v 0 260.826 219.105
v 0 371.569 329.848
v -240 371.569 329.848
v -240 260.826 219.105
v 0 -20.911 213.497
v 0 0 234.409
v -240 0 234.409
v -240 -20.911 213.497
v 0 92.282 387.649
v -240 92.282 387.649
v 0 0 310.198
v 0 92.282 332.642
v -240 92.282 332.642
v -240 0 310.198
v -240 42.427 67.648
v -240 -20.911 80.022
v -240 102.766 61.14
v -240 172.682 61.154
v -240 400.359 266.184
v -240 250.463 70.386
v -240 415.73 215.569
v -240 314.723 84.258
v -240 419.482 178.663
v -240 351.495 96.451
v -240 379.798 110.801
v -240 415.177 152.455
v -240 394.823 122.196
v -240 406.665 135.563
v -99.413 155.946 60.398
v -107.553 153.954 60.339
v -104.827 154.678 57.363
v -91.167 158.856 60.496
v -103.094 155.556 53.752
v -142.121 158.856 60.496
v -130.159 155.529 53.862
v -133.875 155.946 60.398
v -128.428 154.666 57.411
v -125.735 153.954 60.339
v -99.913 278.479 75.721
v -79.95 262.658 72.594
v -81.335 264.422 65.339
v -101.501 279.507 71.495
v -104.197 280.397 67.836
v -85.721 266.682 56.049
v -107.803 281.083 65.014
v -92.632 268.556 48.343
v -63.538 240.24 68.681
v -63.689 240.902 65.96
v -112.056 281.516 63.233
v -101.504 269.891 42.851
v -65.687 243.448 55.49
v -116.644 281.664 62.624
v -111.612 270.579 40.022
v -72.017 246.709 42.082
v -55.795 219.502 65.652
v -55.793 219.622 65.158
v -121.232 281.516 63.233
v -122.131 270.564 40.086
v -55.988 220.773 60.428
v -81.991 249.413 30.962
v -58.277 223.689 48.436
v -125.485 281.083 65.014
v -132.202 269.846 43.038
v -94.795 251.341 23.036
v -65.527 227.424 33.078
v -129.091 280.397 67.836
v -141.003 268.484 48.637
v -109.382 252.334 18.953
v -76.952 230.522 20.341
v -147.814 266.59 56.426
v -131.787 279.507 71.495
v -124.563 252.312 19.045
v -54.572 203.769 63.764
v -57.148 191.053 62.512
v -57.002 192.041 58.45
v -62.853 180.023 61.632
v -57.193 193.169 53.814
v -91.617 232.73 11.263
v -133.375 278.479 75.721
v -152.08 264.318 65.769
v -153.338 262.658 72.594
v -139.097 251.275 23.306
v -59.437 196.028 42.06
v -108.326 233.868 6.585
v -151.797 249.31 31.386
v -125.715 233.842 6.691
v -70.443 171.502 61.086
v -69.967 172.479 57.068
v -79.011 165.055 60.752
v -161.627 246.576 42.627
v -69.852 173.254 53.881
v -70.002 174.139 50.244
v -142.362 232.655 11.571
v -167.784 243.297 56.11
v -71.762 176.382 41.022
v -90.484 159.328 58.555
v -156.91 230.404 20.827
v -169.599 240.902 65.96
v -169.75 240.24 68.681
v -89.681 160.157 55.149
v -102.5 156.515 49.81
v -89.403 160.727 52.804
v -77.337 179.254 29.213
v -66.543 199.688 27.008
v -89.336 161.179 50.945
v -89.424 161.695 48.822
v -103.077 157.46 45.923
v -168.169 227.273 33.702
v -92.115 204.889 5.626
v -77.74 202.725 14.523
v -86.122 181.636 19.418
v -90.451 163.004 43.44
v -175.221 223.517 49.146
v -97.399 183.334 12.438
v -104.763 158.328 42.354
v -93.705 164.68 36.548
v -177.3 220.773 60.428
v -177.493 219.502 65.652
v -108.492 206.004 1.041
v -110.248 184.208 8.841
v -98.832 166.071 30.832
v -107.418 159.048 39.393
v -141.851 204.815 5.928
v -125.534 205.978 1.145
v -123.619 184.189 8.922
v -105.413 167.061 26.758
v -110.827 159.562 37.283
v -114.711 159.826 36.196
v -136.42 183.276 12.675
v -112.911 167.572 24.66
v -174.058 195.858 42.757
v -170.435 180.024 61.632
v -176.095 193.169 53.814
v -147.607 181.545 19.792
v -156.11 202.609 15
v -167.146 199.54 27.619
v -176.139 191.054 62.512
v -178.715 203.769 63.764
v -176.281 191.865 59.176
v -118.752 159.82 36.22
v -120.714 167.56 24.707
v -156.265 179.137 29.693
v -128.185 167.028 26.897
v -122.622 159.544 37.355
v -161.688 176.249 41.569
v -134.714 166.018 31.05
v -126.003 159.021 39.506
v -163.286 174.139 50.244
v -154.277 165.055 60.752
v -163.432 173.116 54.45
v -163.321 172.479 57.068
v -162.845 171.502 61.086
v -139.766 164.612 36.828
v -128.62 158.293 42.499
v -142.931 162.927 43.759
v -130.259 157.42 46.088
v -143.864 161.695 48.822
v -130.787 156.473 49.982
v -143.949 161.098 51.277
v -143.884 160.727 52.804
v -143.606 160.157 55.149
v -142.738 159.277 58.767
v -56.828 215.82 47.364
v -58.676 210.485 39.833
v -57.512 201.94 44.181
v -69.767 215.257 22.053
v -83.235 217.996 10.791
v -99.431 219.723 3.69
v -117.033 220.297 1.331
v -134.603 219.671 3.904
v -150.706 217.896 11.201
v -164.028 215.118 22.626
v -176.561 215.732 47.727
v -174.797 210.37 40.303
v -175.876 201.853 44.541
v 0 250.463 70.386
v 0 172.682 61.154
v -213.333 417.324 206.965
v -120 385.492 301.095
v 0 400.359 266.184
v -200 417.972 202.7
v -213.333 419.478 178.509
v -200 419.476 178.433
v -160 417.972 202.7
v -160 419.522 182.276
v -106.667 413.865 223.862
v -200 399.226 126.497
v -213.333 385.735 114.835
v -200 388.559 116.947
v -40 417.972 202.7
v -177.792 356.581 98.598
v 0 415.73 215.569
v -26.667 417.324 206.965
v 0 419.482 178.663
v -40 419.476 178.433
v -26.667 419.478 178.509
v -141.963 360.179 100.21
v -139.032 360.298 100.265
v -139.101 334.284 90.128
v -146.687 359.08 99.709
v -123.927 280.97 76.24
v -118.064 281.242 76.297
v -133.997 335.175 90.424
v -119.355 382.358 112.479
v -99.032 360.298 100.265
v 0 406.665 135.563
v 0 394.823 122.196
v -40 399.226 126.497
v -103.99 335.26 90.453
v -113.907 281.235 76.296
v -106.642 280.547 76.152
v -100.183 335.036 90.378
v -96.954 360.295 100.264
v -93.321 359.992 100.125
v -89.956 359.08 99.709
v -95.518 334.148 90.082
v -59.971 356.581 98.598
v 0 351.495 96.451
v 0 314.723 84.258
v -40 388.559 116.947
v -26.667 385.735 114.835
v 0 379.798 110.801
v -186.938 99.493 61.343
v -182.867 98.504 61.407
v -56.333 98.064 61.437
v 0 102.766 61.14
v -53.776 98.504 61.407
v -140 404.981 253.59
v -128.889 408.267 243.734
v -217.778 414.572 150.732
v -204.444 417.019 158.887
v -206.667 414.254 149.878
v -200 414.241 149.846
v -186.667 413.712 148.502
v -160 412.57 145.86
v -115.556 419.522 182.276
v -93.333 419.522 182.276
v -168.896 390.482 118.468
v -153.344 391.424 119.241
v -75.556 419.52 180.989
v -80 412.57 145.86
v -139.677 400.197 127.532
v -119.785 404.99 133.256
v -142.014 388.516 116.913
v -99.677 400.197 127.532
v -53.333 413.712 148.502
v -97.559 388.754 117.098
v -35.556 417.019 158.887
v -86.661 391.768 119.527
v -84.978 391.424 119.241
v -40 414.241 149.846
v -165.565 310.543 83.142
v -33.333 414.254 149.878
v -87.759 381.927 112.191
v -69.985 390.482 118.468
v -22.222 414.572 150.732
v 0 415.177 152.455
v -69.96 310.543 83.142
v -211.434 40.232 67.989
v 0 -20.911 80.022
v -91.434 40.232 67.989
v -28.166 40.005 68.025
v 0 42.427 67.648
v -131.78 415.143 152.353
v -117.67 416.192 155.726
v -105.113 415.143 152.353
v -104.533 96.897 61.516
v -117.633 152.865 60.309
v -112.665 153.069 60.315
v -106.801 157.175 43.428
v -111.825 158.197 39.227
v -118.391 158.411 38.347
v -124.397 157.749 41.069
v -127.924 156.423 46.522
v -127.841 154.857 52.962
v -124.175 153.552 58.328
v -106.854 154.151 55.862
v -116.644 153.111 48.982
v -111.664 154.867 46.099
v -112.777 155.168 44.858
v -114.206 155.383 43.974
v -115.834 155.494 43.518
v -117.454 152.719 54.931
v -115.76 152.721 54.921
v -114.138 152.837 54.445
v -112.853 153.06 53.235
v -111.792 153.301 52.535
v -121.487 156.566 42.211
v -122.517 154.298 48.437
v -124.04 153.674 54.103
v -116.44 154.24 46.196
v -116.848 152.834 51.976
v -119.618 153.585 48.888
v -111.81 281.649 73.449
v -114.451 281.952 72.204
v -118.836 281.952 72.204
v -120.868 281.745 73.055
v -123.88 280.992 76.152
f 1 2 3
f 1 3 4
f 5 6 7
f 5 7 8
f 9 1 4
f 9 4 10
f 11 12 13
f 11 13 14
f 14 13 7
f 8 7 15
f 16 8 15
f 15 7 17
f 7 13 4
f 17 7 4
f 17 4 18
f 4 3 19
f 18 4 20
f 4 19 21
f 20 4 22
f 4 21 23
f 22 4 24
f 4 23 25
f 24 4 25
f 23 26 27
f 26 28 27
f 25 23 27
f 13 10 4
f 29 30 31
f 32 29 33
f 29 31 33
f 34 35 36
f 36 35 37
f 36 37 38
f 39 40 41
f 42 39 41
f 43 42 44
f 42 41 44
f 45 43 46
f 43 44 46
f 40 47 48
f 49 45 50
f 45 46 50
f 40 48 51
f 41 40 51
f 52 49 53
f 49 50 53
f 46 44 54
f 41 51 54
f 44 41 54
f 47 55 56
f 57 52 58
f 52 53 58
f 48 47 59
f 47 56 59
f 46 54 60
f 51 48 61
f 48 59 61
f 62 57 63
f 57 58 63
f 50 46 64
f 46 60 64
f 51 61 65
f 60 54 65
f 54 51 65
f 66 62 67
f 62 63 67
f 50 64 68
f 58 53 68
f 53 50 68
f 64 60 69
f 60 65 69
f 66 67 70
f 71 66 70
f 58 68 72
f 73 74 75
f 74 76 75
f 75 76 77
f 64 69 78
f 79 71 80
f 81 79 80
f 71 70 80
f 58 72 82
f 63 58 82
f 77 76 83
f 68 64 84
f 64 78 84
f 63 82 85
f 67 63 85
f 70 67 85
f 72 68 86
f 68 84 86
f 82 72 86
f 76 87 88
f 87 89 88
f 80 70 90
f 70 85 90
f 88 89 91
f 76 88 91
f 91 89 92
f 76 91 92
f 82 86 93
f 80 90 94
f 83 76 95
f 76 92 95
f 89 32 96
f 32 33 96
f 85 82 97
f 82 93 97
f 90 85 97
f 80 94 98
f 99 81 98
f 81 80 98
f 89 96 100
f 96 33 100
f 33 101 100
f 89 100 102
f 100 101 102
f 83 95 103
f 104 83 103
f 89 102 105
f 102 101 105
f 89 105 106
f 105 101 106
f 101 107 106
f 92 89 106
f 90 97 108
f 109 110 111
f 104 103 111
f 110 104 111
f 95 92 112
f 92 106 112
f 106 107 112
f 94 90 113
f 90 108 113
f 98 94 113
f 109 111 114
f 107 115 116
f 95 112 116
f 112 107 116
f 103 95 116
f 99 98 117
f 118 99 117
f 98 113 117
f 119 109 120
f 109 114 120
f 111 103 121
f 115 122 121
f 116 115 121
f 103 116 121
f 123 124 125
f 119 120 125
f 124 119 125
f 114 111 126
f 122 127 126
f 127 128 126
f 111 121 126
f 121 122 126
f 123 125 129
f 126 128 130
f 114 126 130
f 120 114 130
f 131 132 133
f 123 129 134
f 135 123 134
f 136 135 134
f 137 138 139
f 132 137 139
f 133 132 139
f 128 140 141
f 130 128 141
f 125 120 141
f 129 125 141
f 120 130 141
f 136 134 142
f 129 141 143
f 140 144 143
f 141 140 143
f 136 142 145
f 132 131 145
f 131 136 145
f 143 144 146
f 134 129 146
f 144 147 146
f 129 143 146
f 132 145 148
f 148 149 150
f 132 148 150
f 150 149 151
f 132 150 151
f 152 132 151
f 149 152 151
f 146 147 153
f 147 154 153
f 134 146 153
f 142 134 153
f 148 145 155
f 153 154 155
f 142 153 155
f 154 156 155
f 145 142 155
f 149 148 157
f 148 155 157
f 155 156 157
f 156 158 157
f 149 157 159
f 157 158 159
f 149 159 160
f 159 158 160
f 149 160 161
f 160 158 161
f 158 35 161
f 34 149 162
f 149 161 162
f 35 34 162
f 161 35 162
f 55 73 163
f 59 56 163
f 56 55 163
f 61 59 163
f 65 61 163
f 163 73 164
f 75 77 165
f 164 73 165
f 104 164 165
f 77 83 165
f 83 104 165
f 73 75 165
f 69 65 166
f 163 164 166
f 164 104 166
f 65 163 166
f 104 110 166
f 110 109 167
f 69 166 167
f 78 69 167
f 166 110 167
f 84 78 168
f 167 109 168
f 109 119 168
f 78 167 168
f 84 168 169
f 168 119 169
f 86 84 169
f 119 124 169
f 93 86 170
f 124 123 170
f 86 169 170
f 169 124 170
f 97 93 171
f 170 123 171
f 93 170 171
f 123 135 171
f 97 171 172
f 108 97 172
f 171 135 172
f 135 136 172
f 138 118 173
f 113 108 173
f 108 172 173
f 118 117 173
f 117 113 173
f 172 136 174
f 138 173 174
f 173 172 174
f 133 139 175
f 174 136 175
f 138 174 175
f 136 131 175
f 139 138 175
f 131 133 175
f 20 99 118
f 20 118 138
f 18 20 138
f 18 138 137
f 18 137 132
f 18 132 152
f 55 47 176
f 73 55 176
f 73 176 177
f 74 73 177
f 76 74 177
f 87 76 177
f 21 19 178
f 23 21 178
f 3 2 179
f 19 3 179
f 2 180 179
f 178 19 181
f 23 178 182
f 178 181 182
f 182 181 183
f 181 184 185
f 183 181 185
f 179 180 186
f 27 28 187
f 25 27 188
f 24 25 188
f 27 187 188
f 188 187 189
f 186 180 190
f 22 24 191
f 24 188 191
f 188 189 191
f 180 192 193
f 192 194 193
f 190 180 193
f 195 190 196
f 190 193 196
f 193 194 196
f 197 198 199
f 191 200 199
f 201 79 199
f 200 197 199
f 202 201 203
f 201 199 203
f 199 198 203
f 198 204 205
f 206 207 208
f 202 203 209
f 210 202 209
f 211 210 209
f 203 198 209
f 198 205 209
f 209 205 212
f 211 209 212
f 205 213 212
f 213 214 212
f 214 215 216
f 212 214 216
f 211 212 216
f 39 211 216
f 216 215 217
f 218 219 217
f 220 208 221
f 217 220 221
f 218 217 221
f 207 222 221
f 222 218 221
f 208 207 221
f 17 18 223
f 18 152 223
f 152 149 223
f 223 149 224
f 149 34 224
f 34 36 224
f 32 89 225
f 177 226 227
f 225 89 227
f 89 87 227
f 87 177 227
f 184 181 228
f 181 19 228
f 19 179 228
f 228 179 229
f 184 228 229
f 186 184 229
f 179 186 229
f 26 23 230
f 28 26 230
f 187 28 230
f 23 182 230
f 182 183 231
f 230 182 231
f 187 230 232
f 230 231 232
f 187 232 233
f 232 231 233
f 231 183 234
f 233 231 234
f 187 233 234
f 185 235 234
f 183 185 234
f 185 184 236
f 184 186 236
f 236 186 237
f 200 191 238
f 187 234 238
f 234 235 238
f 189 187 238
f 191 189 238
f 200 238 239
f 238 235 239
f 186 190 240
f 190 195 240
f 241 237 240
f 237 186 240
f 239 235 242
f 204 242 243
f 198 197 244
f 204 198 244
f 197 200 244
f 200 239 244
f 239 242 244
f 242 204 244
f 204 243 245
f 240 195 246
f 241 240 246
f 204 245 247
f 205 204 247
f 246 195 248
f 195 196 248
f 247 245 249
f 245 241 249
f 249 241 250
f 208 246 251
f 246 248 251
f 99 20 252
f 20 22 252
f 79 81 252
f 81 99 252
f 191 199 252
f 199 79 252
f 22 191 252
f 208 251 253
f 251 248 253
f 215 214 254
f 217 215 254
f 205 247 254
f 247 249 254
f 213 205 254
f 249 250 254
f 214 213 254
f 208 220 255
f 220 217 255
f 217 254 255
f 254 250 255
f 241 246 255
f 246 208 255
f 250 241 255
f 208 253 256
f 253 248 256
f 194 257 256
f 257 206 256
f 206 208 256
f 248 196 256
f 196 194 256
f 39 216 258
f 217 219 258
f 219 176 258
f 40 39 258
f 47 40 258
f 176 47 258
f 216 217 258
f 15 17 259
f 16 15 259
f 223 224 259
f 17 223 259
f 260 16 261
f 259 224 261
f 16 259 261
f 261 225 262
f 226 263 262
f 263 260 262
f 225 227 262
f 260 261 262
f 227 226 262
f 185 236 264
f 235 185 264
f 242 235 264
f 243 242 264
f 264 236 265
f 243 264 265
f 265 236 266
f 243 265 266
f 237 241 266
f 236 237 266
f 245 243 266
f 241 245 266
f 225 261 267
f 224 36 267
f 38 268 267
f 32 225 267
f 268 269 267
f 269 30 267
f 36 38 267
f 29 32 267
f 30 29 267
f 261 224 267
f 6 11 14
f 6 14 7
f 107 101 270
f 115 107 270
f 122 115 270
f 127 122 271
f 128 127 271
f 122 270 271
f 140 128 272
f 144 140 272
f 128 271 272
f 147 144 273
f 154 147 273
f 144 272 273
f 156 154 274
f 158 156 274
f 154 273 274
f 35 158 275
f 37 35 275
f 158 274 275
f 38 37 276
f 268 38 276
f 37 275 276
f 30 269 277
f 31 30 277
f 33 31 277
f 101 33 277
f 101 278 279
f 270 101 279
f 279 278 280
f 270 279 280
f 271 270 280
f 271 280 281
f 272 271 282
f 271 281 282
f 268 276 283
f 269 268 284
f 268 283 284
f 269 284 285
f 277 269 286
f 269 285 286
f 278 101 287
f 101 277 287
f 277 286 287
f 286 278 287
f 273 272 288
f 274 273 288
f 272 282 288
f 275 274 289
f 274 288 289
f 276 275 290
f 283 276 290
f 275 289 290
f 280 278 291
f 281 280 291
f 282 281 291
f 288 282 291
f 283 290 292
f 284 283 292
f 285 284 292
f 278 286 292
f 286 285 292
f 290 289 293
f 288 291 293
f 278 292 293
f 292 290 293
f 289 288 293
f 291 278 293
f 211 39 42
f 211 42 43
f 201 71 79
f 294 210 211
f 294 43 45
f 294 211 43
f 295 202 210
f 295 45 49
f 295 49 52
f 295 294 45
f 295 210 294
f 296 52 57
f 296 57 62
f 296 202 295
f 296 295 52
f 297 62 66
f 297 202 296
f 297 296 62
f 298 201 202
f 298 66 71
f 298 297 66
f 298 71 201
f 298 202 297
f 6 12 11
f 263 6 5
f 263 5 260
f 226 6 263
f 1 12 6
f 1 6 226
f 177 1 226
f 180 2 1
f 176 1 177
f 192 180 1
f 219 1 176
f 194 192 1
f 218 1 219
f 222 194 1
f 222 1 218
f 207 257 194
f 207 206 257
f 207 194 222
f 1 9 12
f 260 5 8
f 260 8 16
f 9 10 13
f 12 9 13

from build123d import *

# Parameters (mm, degrees)
BOSS_EXTRUDE1_DEPTH = 24
SKETCH11_R          = 5.697753685
CUT_EXTRUDE4_DEPTH  = 7
SCALE1_SCALE        = 10


with BuildPart() as part:
    # Sketch2 → Boss-Extrude1 (new body)
    with BuildSketch(Plane(origin=(0, 0, 0), x_dir=(0, 0, -1), z_dir=(1, 0, 0))):
        with BuildLine():
            Line((-32.984771151, 37.156853259), (-21.910488843, 26.082570951))
            Line((-21.910488843, 26.082570951), (-38.764900737, 9.228159057))
            Line((-38.764900737, 9.228159057), (-33.264173814, 9.228159057))
            Line((-33.264173814, 9.228159057), (-31.019846879, 0))
            Line((-31.019846879, 0), (-23.440853259, 0))
            Line((-23.440853259, 0), (-21.34974547, -2.091107789))
            Line((-21.34974547, -2.091107789), (-8.002162552, -2.091107789))
            add(Edge.make_bspline(
                [(-32.984771151, 37.156853259), (-28.59740608, 39.351452903), (-12.654264242, 47.061104602), (-5.191801864, 21.120328129), (-5.563958224, 8.398722741), (-8.002162552, -2.091107789)],
                knots=[0, 0, 0, 0, 0.297117955, 0.53565113, 1, 1, 1, 1], degree=3))
        make_face()
    extrude(amount=-BOSS_EXTRUDE1_DEPTH)

    # Sketch11 → Cut-Extrude4 (cut)
    with BuildSketch(Plane(origin=(0, 1.148199013, -4.721131737), x_dir=(-1, 0, 0), z_dir=(0, 0.23631575032824995, -0.9716763175804979))):
        with Locations((11.664383963, 22.358606811)):
            Circle(SKETCH11_R)
    extrude(amount=-CUT_EXTRUDE4_DEPTH, mode=Mode.SUBTRACT)

    # Sketch67 → Revolve1 (revolve)
    with BuildSketch(Plane(origin=(0, -0.269695489, 1.108926168), x_dir=(1, 0, 0), z_dir=(0, -0.23631575032824995, 0.9716763175804979))):
        with BuildLine():
            Line((-11.664383963, 29.106819343), (-11.664383963, 16.034921428))
            add(Edge.make_bspline(
                [(-10.249978258, 16.385269123), (-10.936701733, 16.123637578), (-11.664383963, 16.034921428)],
                knots=[0, 0, 0, 1, 1, 1], degree=2))
            add(Edge.make_bspline(
                [(-9.952034037, 28.848556307), (-5.742682801, 26.309194224), (-2.240550386, 18.762433328), (-10.249978258, 16.385269123)],
                knots=[0, 0, 0, 0, 1, 1, 1, 1], degree=3))
            add(Edge.make_bspline(
                [(-9.952034037, 28.848556307), (-10.775072134, 29.212627771), (-11.664383963, 29.106819343)],
                knots=[0, 0, 0, 1, 1, 1], degree=2))
        make_face()
    revolve(axis=Axis((-11.664383963, 21.455633243, 6.392617113), (0, 0.9716763175804978, 0.23631575032824992)))


with BuildPart() as part_1:
    # Scale1: scaled about (0, 0, 0)
    add(part.part.scale(SCALE1_SCALE))


solid = part_1.part
